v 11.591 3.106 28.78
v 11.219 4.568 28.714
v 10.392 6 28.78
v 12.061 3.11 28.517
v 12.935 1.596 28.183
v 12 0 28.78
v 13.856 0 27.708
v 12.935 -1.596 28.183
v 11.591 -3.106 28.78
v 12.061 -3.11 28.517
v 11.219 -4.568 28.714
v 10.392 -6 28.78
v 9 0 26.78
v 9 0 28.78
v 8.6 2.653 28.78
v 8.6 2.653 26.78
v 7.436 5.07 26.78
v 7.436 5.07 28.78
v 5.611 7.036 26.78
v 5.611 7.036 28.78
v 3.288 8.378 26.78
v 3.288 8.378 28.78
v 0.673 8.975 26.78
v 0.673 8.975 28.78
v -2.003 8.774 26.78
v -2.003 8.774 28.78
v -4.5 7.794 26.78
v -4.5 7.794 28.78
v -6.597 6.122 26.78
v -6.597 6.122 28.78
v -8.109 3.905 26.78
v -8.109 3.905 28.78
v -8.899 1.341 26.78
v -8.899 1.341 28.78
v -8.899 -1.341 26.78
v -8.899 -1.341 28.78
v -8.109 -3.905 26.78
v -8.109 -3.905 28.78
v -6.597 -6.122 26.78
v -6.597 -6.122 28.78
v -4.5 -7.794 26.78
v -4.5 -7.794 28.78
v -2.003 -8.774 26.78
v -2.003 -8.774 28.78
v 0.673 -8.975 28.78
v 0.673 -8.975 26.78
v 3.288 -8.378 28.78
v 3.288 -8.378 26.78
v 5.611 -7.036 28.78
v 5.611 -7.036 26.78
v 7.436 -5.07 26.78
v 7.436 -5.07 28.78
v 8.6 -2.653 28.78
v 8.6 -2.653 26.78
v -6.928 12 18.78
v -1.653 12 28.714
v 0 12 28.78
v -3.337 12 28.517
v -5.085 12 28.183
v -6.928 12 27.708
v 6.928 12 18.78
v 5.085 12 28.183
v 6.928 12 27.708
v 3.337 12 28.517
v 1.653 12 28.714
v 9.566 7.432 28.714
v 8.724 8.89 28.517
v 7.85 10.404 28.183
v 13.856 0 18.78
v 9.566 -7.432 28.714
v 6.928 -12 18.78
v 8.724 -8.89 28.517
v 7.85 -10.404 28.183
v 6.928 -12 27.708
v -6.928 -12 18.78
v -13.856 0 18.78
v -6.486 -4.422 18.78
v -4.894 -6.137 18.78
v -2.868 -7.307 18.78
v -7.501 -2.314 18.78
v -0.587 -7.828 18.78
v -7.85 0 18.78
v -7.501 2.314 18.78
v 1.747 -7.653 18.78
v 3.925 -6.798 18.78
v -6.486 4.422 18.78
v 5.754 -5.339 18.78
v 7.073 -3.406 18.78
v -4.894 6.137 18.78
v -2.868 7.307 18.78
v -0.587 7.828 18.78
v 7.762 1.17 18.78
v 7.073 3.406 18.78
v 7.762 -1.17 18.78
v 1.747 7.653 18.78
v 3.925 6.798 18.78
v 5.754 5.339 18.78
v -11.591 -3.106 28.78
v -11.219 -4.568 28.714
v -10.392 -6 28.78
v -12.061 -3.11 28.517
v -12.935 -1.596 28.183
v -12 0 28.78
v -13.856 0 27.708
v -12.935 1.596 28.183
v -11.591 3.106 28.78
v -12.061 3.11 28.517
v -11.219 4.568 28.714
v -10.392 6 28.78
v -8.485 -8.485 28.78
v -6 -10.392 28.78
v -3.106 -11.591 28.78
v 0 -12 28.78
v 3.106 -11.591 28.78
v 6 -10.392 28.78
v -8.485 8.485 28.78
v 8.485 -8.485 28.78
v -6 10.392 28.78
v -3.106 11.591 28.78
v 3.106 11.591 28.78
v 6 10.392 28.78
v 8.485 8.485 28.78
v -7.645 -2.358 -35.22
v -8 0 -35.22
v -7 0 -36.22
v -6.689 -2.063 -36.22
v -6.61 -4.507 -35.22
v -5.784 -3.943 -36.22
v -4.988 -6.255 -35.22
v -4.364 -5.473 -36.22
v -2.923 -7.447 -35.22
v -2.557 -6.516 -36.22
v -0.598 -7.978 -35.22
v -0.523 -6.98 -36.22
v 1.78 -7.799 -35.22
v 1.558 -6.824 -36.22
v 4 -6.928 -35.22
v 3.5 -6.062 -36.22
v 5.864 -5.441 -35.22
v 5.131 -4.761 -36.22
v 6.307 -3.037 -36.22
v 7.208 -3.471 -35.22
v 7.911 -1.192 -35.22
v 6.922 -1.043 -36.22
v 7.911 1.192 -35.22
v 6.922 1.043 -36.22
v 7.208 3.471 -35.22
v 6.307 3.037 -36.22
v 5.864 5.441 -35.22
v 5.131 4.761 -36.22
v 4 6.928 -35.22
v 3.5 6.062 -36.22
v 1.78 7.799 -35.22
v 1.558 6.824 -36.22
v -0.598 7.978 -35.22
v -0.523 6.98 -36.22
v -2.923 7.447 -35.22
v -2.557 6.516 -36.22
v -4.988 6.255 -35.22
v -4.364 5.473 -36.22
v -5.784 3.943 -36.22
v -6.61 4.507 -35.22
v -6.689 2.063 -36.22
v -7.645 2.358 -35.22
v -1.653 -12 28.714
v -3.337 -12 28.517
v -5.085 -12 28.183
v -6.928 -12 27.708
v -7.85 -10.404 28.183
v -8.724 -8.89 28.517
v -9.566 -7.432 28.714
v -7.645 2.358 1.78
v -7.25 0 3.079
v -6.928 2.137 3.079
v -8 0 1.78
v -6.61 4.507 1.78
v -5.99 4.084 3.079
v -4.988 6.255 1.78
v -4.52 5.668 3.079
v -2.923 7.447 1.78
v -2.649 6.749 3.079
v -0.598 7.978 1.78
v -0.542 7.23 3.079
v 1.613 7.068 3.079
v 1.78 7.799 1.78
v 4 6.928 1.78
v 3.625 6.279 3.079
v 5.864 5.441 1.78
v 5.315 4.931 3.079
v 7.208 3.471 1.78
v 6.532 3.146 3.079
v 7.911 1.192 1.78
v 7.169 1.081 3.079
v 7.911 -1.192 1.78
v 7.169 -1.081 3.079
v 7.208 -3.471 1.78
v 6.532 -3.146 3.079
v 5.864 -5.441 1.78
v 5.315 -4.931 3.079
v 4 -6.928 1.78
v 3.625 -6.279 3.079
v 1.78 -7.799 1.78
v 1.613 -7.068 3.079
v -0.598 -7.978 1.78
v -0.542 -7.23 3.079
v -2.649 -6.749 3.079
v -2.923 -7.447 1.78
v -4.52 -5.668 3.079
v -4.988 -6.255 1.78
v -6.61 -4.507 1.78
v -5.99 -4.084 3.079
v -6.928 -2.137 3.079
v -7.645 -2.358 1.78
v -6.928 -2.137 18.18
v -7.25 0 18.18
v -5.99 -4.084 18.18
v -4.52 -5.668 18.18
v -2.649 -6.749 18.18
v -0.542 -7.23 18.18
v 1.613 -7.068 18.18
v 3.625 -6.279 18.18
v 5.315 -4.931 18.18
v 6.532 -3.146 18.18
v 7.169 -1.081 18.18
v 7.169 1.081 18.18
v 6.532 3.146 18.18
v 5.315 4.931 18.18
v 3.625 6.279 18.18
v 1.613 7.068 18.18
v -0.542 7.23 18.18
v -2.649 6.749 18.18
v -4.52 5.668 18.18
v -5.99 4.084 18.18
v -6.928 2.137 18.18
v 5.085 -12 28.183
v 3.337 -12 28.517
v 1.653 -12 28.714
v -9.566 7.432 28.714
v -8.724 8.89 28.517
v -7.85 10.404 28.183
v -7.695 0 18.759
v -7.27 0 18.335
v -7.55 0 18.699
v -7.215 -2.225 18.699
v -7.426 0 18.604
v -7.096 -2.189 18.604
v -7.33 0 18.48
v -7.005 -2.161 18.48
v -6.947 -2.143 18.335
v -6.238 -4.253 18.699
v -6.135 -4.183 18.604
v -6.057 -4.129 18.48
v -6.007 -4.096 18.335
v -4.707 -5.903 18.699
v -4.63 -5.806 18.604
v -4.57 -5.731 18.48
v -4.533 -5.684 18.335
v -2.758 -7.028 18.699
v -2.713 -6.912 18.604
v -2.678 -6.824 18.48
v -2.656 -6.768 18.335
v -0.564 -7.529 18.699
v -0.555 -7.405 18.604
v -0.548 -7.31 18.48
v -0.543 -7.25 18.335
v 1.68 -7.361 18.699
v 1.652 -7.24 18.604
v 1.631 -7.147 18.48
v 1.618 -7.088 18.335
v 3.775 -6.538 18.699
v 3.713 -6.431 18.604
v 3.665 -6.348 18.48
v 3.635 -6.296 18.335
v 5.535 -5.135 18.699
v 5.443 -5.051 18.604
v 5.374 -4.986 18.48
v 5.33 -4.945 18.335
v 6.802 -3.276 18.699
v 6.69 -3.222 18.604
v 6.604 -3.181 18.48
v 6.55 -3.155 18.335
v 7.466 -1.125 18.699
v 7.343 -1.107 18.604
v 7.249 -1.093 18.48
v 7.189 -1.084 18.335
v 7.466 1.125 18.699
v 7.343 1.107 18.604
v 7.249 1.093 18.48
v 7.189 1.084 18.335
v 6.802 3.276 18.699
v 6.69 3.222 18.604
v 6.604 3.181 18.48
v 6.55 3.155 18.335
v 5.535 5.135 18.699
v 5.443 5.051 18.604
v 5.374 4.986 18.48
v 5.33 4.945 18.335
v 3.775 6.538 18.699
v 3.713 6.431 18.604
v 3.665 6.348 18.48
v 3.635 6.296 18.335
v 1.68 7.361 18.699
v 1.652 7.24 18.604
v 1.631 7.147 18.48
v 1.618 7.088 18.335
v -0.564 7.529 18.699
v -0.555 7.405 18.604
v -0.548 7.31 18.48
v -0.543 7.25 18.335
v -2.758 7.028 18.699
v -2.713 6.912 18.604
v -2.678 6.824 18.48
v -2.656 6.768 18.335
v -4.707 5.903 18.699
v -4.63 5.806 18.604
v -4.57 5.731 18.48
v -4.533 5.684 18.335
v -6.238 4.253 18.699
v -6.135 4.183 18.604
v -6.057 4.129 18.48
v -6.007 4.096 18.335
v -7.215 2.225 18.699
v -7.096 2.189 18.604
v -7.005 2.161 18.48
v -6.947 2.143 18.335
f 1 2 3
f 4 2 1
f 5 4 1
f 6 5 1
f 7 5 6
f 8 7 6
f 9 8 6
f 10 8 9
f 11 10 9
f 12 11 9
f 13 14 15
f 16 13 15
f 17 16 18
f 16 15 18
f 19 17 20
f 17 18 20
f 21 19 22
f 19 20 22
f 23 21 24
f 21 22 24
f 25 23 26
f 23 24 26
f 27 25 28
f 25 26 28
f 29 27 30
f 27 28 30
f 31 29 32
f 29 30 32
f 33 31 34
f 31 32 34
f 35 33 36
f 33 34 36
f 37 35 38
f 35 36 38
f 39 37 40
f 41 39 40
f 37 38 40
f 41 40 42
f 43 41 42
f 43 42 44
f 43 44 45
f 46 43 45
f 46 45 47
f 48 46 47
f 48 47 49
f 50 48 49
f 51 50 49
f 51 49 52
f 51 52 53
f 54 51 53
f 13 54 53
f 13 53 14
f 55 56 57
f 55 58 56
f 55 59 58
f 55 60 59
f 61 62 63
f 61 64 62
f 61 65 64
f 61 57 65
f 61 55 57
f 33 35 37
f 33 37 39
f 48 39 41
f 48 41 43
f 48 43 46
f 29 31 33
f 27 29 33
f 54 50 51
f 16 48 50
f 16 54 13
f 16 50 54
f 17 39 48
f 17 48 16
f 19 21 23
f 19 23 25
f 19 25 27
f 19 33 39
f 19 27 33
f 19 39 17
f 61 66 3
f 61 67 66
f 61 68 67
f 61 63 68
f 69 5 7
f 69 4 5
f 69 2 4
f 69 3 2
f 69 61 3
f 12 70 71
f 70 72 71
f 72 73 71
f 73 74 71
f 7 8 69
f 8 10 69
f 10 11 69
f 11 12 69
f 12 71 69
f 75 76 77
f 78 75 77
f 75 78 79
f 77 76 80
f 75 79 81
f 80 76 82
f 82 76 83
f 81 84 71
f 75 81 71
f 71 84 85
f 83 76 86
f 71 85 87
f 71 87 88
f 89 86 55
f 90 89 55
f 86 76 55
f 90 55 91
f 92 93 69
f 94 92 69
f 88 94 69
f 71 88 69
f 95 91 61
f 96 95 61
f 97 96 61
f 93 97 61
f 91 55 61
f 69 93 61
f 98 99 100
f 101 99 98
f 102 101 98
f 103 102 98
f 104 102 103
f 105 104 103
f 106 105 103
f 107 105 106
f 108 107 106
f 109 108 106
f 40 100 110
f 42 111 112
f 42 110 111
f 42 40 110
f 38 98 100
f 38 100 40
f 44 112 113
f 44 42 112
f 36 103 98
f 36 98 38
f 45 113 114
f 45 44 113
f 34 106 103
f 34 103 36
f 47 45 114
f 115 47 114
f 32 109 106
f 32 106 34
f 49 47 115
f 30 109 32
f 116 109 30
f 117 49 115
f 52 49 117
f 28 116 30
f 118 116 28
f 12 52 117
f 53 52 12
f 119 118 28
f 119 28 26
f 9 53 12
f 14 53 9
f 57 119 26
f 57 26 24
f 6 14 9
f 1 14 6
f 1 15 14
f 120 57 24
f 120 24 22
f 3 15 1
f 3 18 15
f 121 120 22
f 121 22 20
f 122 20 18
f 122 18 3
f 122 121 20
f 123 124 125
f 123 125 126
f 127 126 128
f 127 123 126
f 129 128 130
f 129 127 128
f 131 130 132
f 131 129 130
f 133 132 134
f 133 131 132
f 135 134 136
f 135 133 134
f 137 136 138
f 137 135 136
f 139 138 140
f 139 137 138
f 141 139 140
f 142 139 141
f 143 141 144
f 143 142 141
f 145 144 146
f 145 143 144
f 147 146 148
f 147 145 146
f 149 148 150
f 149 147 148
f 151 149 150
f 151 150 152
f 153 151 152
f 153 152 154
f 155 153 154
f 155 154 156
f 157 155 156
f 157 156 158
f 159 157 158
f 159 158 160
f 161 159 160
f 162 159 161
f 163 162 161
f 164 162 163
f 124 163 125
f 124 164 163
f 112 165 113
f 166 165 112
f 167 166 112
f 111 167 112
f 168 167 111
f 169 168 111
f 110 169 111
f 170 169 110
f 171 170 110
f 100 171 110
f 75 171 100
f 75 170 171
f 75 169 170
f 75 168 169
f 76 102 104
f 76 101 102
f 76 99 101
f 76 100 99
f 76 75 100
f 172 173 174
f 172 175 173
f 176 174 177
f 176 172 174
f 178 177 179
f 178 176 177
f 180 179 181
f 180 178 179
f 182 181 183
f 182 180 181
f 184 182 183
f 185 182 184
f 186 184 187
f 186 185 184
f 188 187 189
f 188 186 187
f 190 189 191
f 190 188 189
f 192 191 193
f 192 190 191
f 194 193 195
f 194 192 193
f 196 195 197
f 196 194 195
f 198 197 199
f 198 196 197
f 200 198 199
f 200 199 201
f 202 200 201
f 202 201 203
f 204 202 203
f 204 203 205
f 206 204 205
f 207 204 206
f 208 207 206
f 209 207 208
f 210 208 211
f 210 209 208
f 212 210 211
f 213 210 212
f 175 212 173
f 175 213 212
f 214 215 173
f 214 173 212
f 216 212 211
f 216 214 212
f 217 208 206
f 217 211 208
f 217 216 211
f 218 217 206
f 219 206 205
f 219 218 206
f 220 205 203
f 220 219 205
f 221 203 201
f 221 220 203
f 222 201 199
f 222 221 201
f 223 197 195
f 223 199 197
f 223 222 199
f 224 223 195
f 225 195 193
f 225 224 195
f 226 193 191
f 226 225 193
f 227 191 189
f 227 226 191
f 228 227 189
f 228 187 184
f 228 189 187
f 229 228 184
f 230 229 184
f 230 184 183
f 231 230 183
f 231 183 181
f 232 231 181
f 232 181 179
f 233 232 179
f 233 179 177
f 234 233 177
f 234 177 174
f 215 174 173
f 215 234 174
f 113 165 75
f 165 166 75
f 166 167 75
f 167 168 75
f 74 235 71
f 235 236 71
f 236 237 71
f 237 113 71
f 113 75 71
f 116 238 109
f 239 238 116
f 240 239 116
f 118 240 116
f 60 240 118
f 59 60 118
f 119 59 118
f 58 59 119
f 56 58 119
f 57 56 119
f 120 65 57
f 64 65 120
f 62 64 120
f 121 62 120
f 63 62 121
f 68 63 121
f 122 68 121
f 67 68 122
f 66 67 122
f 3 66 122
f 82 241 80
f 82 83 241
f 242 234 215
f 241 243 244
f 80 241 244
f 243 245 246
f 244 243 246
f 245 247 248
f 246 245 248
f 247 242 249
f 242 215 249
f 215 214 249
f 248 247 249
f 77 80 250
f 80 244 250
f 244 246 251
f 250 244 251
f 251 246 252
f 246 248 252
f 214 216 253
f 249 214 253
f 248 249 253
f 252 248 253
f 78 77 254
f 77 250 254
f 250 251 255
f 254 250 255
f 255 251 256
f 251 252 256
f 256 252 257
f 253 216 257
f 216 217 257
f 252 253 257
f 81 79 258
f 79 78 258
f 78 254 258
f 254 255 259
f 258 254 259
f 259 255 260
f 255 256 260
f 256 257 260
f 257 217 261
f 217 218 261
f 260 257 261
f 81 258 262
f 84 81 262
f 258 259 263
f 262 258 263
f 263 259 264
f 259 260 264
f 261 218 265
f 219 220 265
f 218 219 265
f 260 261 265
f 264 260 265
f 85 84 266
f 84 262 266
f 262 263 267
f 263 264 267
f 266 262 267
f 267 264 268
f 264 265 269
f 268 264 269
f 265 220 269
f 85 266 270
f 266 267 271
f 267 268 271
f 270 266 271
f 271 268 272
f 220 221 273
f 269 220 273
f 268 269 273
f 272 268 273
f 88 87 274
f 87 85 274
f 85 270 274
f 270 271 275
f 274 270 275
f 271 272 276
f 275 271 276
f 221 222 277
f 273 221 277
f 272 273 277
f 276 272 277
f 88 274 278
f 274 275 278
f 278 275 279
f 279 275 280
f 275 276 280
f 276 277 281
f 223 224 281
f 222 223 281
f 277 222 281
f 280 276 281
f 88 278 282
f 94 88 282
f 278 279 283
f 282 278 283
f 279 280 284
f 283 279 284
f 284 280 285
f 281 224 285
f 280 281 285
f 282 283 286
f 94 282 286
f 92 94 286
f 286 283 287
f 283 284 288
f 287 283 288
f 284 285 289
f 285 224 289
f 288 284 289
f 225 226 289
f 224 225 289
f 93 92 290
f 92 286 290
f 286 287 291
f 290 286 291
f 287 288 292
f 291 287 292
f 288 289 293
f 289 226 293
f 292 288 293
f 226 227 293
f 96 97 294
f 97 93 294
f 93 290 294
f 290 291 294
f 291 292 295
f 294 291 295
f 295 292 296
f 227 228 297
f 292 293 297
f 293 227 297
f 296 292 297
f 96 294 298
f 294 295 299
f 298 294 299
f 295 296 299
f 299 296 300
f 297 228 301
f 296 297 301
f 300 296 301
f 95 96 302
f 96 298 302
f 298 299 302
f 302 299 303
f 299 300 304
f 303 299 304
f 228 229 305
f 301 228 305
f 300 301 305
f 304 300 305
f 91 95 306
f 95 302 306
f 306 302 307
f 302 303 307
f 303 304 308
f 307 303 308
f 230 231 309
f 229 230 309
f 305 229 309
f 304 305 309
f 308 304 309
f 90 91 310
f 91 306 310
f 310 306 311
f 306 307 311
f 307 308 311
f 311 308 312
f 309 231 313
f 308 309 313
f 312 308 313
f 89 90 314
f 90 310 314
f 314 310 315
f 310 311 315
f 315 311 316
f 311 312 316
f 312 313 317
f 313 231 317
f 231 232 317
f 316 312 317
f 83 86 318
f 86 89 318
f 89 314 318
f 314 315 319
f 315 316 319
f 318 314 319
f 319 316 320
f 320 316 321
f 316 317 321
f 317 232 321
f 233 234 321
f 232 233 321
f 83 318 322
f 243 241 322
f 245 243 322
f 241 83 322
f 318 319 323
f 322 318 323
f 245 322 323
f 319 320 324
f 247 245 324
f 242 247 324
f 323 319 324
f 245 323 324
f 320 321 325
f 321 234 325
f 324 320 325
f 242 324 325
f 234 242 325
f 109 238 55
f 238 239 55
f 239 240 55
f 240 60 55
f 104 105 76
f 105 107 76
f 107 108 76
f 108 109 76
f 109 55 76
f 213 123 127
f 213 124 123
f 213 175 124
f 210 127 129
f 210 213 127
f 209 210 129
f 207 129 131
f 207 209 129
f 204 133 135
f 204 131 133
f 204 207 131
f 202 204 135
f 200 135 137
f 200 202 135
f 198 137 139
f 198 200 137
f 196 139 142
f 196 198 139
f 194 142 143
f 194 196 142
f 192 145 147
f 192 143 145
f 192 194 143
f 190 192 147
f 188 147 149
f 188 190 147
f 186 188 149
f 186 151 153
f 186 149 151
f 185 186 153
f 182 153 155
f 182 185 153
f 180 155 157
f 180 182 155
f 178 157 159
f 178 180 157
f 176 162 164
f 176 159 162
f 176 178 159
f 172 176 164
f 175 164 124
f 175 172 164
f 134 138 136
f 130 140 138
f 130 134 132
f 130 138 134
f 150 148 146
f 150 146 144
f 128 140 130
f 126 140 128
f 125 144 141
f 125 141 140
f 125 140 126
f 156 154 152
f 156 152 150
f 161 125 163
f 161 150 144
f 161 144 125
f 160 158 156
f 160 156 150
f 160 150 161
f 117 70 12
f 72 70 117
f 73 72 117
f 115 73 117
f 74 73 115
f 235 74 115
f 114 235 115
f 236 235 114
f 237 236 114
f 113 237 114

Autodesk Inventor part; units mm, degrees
ref_plane "YZ Plane" through (0, 0, 0) normal (1, 0, 0) x (0, 1, 0)
sketch "Schizzo2" plane through (0, 0, 0) normal (0, 1, 0) x (-1, 0, 0)
  line L0 (0, 18.7798) -> (0, -36.2202)
  line L1 (0, -36.2202) -> (7, -36.2202)
  line L2 (8, -35.2202) -> (8, 1.7798)
  line L3 (8, 1.7798) -> (7.25, 3.0788)
  line L4 (7.25, 3.0788) -> (7.25, 18.7798)
  line L5 (7.25, 18.7798) -> (0, 18.7798)
  line L6 (7, -36.2202) -> (8, -35.2202)
  line L7 (8, -36.2202) -> (8, -37.6344)
  line L8 (0, -48.9172) -> (0, 30.0627) projected
  dimension "Ds" = 14.5
  dimension "NND" = 16
  dimension "b" = 38
  dimension "d3" = 30
  dimension "d5" = 45
  dimension "PTC" = 2
  dimension "NLG" = 55
revolve "Rivoluzione1" add sketch "Schizzo2" angle 360 about axis through (0, 0, 18.7798) along (0, 0, -1)
sketch "Schizzo3" plane through (0, 0, 18.7798) normal (0, 0, 1) x (1, 0, 0)
  circle A0 centre (0, 0) radius 7.25 projected
  line L0 (0, 12) -> (6.9282, 12)
  line L1 (6.9282, 12) -> (13.8564, 0)
  line L2 (13.8564, 0) -> (0, 0)
  line L3 (0, 0) -> (0, 12)
  line L4 (0, 12) -> (-6.9282, 12)
  line L5 (-6.9282, 12) -> (-13.8564, 0)
  line L6 (0, -12) -> (6.9282, -12)
  line L7 (6.9282, -12) -> (13.8564, 0)
  line L8 (-6.9282, -12) -> (-13.8564, 0)
  line L9 (0, -12) -> (-6.9282, -12)
  dimension "d9" = 60
  dimension "ParS" = 24
  dimension "msp_d11" = 24
extrude "Estrusione1" add sketch "Schizzo3" along normal blind 10
sketch "Schizzo4" plane through (0, 0, 0) normal (0, 1, 0) x (-1, 0, 0)
  line L0 (-12, 28.7798) -> (-13.8564, 28.7798)
  line L1 (-13.8564, 28.7798) -> (-13.8564, 27.708)
  line L2 (-13.8564, 27.708) -> (-12, 28.7798)
  line L3 (0, 16.7798) -> (0, 30.7798) projected
  line L4 (0, 28.2505) -> (0, 27.1787)
  line L5 (-13.8564, 18.7798) -> (-13.8564, 28.7798) projected
  line L6 (-6.9282, 28.7798) -> (-13.8564, 28.7798) projected
  dimension "d14" = 30
  dimension "msp_d15" = 24
revolve "Rivoluzione2" cut sketch "Schizzo4" angle 360 about axis through (0, 0, 28.2505) along (0, 0, -1)
sketch "Sketch5" plane through (0, 0, 28.7798) normal (0, 0, 1) x (1, 0, 0)
  arc A0 (10.3923, 6) -> (0, 12) centre (0, 0) ccw projected
  circle A1 centre (0, 0) radius 9
  dimension "d27" = 18
extrude "Extrusion2" cut sketch "Sketch5" against normal blind 2
thread "Filettatura1" size "M16x2" class "6g" standard "ISO Metric profile" full length
ref_plane "MSC_PF1" through (0, 0, 0) normal (0, 1, 0) x (-1, 0, 0)
ref_plane "MSC_PT1" through (0, 0, 18.7798) normal (0, 0, -1) x (-1, 0, 0)
fillet "Fillet1" radius 0.6 1 edges at (7.25, 0, 18.7798)
equation "\"d27\" = 0.75 * ParS"
equation "\"d28\" = 0.2 * ParK"
equation "\"d30\" = r"
equation "\"msp_d11\" = ParS"
equation "\"msp_d17\" = b"
equation "\"msp_d15\" = ParS"
equation "\"r\" = 0.6"
equation "\"THREADDIA\" = NND"
equation "\"ParK\" = 10"
properties part number "BS EN ISO 4015 - M16x55" material "Acciaio inox, 440C"
